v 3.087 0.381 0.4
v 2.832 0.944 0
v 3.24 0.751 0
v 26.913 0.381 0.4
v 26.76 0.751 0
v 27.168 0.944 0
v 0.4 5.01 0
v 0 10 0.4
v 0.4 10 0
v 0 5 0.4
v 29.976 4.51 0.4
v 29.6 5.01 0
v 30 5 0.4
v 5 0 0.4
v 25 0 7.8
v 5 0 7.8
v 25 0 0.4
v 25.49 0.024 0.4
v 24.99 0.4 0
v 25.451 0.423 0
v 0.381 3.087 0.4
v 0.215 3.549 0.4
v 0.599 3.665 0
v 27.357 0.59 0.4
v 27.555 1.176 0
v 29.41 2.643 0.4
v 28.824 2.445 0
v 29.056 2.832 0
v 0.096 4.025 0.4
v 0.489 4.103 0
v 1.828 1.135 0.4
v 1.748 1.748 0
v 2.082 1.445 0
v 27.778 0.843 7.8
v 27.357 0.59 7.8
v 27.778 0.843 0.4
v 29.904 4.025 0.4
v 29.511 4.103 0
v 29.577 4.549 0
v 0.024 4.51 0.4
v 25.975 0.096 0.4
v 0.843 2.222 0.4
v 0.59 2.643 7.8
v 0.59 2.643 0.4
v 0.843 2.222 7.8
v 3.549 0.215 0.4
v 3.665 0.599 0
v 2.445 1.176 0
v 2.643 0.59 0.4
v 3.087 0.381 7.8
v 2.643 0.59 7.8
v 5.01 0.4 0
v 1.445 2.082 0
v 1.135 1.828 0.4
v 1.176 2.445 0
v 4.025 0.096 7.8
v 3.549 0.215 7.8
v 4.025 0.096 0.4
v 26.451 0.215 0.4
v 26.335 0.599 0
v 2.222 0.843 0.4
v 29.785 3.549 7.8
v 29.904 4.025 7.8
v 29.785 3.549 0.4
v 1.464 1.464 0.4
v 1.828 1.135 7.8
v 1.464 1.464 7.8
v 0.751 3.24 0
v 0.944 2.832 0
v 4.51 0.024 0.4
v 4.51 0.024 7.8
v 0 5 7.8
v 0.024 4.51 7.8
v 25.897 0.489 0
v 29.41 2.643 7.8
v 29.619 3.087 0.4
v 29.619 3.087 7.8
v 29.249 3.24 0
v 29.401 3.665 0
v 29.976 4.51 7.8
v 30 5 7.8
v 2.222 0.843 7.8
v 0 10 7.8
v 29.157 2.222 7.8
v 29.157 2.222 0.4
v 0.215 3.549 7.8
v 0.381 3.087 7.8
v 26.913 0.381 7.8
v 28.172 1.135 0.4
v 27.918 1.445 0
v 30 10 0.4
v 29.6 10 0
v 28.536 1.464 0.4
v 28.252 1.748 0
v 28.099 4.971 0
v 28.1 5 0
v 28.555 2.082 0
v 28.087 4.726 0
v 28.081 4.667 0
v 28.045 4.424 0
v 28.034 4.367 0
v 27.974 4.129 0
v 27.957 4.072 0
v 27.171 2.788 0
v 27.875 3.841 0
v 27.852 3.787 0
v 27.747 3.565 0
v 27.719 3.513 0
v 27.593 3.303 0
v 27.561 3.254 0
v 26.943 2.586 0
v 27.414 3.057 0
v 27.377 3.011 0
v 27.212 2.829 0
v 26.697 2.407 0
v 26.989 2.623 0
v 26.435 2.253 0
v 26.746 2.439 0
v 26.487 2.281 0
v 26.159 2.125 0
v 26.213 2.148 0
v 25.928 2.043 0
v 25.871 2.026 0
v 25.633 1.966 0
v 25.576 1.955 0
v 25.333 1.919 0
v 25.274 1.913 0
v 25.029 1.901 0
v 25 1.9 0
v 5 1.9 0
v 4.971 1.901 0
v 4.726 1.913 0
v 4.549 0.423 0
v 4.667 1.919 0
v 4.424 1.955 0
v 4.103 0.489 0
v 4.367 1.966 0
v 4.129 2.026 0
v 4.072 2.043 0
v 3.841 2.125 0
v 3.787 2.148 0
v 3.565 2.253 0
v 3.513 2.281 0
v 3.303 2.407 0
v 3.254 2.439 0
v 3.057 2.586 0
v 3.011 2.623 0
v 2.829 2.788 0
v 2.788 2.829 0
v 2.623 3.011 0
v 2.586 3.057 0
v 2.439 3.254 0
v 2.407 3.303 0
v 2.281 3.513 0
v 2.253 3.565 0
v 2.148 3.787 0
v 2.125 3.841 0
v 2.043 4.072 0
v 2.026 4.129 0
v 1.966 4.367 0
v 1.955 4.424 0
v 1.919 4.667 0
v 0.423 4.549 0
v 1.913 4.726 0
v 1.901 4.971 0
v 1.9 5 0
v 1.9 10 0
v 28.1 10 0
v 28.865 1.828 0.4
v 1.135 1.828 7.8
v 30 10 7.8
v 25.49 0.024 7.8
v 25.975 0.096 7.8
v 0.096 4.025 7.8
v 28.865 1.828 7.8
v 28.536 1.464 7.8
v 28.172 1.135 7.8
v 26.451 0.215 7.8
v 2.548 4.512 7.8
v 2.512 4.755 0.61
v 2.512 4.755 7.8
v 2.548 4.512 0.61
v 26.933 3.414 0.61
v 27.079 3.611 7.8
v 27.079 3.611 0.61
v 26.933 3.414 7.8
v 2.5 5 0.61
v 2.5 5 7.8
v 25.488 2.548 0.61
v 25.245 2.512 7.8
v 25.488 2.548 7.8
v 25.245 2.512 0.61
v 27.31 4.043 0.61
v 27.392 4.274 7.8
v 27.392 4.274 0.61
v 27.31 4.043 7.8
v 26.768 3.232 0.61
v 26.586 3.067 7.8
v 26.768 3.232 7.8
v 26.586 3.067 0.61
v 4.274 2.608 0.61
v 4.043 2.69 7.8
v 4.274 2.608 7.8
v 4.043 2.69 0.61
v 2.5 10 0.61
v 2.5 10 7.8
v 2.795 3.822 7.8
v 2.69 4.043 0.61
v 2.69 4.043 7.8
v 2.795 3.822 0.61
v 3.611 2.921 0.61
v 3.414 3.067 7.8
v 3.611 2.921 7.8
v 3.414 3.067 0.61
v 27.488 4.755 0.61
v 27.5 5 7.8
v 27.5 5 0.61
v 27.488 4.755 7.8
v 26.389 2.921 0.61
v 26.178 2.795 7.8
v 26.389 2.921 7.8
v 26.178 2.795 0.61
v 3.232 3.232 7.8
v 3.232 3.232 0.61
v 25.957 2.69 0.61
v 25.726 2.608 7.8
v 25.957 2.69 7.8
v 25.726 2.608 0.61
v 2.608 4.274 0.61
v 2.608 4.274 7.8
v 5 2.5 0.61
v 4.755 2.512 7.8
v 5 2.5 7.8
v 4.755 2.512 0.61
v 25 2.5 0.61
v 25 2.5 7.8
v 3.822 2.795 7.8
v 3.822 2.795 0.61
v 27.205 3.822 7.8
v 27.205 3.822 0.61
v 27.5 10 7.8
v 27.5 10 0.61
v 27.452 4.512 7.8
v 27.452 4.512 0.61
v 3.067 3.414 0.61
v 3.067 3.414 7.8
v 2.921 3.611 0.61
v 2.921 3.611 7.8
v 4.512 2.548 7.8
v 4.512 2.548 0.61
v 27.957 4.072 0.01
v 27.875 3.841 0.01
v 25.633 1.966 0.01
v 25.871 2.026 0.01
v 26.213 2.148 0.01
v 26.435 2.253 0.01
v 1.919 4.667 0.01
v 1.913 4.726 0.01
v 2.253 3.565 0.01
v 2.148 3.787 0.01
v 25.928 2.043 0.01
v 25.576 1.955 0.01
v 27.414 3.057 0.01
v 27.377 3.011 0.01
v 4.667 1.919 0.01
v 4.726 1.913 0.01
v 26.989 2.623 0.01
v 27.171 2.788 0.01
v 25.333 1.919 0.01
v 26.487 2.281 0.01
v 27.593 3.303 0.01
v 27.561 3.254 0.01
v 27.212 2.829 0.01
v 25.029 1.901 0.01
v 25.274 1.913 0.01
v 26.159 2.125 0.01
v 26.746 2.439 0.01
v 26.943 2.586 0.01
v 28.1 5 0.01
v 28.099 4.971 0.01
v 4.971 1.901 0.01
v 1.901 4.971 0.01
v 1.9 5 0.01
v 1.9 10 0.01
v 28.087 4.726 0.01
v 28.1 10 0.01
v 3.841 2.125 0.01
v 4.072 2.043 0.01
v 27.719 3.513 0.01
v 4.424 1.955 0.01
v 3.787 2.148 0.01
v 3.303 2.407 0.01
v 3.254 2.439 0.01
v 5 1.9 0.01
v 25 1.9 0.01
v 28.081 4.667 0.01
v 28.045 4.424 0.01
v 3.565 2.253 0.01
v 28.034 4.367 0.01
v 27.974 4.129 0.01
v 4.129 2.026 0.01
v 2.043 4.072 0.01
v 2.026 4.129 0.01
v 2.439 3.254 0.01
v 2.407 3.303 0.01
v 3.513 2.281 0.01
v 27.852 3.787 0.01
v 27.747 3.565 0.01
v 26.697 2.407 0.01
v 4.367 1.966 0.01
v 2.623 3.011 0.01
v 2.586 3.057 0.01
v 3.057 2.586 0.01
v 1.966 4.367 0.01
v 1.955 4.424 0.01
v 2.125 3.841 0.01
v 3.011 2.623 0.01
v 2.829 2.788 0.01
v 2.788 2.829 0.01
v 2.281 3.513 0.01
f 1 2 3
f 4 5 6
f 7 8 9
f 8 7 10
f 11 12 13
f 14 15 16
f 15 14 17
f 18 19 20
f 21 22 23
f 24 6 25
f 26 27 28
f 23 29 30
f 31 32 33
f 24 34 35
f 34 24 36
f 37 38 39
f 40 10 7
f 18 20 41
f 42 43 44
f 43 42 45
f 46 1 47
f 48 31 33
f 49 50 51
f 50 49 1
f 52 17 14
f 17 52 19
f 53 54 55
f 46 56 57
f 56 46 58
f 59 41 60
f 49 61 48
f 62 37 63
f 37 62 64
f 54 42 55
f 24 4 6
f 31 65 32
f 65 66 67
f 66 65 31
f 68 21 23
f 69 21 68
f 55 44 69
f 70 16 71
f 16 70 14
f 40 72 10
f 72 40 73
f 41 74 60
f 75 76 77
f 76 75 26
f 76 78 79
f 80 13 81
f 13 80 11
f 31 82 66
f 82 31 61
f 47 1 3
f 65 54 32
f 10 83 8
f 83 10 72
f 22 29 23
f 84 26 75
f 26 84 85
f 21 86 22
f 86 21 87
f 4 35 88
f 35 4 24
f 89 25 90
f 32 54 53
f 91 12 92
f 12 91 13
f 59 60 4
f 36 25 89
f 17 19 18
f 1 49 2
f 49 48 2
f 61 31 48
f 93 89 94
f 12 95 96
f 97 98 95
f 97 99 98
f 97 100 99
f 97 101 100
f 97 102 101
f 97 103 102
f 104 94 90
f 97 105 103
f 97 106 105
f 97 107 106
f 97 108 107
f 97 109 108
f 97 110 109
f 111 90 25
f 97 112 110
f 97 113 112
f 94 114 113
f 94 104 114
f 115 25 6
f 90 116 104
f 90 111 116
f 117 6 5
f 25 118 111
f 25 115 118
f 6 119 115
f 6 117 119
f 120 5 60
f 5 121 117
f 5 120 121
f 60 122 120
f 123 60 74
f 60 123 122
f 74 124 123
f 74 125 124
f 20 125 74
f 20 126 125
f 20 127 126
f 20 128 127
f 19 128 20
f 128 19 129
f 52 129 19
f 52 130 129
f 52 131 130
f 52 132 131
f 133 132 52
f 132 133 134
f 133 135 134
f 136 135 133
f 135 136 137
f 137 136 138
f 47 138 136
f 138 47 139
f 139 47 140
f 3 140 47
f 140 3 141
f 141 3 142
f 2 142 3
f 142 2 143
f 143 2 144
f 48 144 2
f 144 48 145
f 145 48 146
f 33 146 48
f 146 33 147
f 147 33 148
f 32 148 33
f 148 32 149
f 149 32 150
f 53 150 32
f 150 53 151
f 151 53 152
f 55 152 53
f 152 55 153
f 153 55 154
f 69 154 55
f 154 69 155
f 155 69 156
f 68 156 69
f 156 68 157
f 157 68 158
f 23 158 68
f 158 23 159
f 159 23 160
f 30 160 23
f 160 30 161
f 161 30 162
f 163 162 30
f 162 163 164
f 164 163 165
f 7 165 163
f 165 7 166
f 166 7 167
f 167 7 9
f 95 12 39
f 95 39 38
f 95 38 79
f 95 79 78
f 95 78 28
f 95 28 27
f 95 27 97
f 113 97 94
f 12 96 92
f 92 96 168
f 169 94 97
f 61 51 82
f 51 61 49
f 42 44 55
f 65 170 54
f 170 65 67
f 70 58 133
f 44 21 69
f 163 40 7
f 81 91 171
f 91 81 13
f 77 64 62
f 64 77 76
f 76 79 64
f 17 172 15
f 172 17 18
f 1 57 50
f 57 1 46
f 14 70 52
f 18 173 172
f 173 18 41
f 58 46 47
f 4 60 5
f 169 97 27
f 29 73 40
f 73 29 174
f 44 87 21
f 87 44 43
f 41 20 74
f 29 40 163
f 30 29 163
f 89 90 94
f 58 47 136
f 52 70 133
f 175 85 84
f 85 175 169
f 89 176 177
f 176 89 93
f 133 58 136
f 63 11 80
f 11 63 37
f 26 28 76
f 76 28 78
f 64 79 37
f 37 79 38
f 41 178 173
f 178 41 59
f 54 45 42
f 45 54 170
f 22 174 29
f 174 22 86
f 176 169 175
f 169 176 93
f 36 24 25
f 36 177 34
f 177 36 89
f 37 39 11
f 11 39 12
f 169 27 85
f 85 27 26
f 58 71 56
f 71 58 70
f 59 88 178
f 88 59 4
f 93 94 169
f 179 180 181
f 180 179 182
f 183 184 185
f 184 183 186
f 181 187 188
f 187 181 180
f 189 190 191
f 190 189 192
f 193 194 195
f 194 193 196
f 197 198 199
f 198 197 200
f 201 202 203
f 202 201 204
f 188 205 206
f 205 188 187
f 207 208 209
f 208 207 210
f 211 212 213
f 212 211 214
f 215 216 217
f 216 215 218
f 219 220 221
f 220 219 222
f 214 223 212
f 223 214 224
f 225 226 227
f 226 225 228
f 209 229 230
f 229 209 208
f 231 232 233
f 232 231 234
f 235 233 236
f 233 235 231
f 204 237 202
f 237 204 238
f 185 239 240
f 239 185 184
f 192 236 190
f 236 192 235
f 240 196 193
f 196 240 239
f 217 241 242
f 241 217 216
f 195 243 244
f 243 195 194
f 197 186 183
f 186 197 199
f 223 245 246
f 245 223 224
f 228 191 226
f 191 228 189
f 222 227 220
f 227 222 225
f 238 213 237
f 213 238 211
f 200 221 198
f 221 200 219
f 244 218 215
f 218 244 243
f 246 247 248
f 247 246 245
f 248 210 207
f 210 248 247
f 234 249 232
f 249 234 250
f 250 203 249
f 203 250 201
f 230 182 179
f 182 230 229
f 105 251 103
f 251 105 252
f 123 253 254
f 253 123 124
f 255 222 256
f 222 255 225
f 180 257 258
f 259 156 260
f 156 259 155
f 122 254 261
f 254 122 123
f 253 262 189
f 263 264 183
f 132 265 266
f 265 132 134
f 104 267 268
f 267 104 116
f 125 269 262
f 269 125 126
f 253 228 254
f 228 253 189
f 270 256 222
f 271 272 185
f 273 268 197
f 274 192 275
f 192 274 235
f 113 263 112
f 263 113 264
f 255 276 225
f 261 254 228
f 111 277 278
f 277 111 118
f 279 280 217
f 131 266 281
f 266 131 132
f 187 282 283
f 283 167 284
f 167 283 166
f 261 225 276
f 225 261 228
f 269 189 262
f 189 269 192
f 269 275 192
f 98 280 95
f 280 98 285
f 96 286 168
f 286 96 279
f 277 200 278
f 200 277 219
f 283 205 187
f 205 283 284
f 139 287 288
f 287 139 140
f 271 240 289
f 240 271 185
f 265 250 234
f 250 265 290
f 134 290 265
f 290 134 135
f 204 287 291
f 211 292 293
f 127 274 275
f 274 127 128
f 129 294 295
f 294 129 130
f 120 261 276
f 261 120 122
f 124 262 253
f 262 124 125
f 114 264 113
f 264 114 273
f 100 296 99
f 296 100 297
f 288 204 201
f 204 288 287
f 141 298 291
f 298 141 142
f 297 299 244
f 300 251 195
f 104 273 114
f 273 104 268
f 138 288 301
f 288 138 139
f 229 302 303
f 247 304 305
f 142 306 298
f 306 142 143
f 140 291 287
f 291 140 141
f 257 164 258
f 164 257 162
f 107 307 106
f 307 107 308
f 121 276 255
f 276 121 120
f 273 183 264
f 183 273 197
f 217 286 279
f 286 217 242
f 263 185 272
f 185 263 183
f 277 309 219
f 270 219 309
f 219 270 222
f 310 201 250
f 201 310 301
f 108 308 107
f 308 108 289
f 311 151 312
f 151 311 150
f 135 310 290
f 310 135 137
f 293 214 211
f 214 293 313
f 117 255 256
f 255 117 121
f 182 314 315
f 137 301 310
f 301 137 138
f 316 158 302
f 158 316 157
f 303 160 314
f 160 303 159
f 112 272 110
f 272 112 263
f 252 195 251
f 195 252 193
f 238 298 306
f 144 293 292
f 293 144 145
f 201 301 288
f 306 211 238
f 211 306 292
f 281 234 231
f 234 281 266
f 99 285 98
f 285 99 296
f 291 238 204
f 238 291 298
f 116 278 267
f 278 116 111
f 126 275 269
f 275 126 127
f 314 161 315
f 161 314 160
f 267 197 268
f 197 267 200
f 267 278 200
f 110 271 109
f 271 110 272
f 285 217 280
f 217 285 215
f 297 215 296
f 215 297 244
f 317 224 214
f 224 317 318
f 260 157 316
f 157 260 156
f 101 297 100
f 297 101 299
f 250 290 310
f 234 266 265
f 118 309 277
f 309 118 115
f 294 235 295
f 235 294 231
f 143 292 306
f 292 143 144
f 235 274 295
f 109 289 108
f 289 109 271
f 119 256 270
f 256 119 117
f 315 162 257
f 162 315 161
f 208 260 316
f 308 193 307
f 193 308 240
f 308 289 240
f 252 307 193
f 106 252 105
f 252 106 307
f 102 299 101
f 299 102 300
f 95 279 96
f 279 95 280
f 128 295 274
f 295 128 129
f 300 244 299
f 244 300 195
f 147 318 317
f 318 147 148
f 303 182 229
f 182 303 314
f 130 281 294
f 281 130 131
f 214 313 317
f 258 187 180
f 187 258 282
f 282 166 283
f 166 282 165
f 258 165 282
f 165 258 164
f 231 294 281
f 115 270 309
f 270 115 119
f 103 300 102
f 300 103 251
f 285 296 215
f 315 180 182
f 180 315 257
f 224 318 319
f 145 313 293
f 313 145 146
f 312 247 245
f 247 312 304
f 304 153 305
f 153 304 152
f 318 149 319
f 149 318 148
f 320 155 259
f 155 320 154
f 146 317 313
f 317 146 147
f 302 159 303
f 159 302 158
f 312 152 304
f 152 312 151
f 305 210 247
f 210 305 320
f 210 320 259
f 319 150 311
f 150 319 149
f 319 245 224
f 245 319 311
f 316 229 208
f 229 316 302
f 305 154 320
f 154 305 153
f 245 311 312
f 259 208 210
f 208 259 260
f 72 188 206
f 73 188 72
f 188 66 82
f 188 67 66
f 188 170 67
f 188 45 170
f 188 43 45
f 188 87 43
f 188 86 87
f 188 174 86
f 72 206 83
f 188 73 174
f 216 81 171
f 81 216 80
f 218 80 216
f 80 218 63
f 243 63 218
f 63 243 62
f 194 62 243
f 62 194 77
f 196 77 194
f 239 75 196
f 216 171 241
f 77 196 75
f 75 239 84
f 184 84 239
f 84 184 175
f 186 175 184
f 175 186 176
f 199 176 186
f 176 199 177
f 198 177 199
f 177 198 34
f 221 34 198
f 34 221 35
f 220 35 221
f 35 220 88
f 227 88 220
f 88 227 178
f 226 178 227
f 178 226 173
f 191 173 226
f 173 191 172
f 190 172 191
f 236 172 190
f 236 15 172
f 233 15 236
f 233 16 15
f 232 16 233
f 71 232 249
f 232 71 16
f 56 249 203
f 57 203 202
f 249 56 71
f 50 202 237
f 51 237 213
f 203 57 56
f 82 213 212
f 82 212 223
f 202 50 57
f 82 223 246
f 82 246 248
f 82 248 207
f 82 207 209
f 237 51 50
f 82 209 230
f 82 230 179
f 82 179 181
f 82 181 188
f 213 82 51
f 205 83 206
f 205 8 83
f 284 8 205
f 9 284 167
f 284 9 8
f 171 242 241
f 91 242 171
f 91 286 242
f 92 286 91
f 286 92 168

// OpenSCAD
// Rounded rectangular tube — construction walkthrough.
//
// This file is deliberately separate from the printable example.
// It exposes the intermediate geometry used to create the two end chamfers
// and ends with a cutaway close-up of the finished lower end.

$fn = 64;

design_step = "09_chamfer_closeup"; // [01_profiles,02_outer_chamfer_inputs,03_outer_hull,04_hollow_tube,05_inner_chamfer_inputs,06_inner_chamfer_cut,07_bottom_chamfer_result,08_final,09_chamfer_closeup]

outer_width    = 30;
outer_depth    = 20;
length         = 60;
wall_thickness = 2.5;
outer_radius   = 5;

inner_chamfer = 0.6;
outer_chamfer = 0.4;
epsilon = 0.01;

inner_width  = outer_width - 2 * wall_thickness;
inner_depth  = outer_depth - 2 * wall_thickness;
inner_radius = max(outer_radius - wall_thickness, 0.01);

module rounded_rectangle(width, depth, radius) {
    hull()
        for (x = [radius, width - radius],
             y = [radius, depth - radius])
            translate([x, y])
                circle(radius);
}

module outer_2d()
    rounded_rectangle(outer_width, outer_depth, outer_radius);

module inner_2d()
    translate([wall_thickness, wall_thickness])
        rounded_rectangle(inner_width, inner_depth, inner_radius);

module thin_outer_profile(z, inset = 0, thickness = 0.08) {
    translate([0, 0, z])
        linear_extrude(thickness)
            offset(delta = inset)
                outer_2d();
}

module thin_inner_profile(z, expansion = 0, thickness = 0.08) {
    translate([0, 0, z])
        linear_extrude(thickness)
            offset(delta = expansion)
                inner_2d();
}

module outer_body() {
    hull() {
        translate([0, 0, 0])
            linear_extrude(epsilon)
                offset(delta = -outer_chamfer)
                    outer_2d();

        translate([0, 0, outer_chamfer])
            linear_extrude(length - 2 * outer_chamfer)
                outer_2d();

        translate([0, 0, length - epsilon])
            linear_extrude(epsilon)
                offset(delta = -outer_chamfer)
                    outer_2d();
    }
}

module continuous_inner_void(extra = 1) {
    translate([0, 0, -extra])
        linear_extrude(length + 2 * extra)
            inner_2d();
}

module inner_chamfer_cut() {
    hull() {
        translate([0, 0, -epsilon])
            linear_extrude(2 * epsilon)
                offset(r = inner_chamfer)
                    inner_2d();

        translate([0, 0, inner_chamfer])
            linear_extrude(epsilon)
                inner_2d();
    }
}

module hollow_tube_without_inner_chamfers() {
    difference() {
        outer_body();
        continuous_inner_void();
    }
}

module final_tube() {
    difference() {
        hollow_tube_without_inner_chamfers();

        inner_chamfer_cut();

        translate([0, 0, length])
            mirror([0, 0, 1])
                inner_chamfer_cut();
    }
}

// Cutaway of the lower end so the outside and inside chamfers can be
// inspected together. Only half the depth is kept and only the lowest
// 8 mm of the tube is shown.
module chamfer_closeup_stage() {
    intersection() {
        final_tube();

        translate([-2, -2, -0.2])
            cube([
                outer_width + 4,
                outer_depth / 2 + 2,
                8
            ]);
    }
}

if (design_step == "01_profiles")
    profiles_stage();
else if (design_step == "02_outer_chamfer_inputs")
    outer_chamfer_inputs_stage();
else if (design_step == "03_outer_hull")
    outer_hull_stage();
else if (design_step == "04_hollow_tube")
    hollow_stage();
else if (design_step == "05_inner_chamfer_inputs")
    inner_chamfer_inputs_stage();
else if (design_step == "06_inner_chamfer_cut")
    inner_chamfer_cut_stage();
else if (design_step == "07_bottom_chamfer_result")
    bottom_chamfer_result_stage();
else if (design_step == "08_final")
    final_tube();
else
    chamfer_closeup_stage();
